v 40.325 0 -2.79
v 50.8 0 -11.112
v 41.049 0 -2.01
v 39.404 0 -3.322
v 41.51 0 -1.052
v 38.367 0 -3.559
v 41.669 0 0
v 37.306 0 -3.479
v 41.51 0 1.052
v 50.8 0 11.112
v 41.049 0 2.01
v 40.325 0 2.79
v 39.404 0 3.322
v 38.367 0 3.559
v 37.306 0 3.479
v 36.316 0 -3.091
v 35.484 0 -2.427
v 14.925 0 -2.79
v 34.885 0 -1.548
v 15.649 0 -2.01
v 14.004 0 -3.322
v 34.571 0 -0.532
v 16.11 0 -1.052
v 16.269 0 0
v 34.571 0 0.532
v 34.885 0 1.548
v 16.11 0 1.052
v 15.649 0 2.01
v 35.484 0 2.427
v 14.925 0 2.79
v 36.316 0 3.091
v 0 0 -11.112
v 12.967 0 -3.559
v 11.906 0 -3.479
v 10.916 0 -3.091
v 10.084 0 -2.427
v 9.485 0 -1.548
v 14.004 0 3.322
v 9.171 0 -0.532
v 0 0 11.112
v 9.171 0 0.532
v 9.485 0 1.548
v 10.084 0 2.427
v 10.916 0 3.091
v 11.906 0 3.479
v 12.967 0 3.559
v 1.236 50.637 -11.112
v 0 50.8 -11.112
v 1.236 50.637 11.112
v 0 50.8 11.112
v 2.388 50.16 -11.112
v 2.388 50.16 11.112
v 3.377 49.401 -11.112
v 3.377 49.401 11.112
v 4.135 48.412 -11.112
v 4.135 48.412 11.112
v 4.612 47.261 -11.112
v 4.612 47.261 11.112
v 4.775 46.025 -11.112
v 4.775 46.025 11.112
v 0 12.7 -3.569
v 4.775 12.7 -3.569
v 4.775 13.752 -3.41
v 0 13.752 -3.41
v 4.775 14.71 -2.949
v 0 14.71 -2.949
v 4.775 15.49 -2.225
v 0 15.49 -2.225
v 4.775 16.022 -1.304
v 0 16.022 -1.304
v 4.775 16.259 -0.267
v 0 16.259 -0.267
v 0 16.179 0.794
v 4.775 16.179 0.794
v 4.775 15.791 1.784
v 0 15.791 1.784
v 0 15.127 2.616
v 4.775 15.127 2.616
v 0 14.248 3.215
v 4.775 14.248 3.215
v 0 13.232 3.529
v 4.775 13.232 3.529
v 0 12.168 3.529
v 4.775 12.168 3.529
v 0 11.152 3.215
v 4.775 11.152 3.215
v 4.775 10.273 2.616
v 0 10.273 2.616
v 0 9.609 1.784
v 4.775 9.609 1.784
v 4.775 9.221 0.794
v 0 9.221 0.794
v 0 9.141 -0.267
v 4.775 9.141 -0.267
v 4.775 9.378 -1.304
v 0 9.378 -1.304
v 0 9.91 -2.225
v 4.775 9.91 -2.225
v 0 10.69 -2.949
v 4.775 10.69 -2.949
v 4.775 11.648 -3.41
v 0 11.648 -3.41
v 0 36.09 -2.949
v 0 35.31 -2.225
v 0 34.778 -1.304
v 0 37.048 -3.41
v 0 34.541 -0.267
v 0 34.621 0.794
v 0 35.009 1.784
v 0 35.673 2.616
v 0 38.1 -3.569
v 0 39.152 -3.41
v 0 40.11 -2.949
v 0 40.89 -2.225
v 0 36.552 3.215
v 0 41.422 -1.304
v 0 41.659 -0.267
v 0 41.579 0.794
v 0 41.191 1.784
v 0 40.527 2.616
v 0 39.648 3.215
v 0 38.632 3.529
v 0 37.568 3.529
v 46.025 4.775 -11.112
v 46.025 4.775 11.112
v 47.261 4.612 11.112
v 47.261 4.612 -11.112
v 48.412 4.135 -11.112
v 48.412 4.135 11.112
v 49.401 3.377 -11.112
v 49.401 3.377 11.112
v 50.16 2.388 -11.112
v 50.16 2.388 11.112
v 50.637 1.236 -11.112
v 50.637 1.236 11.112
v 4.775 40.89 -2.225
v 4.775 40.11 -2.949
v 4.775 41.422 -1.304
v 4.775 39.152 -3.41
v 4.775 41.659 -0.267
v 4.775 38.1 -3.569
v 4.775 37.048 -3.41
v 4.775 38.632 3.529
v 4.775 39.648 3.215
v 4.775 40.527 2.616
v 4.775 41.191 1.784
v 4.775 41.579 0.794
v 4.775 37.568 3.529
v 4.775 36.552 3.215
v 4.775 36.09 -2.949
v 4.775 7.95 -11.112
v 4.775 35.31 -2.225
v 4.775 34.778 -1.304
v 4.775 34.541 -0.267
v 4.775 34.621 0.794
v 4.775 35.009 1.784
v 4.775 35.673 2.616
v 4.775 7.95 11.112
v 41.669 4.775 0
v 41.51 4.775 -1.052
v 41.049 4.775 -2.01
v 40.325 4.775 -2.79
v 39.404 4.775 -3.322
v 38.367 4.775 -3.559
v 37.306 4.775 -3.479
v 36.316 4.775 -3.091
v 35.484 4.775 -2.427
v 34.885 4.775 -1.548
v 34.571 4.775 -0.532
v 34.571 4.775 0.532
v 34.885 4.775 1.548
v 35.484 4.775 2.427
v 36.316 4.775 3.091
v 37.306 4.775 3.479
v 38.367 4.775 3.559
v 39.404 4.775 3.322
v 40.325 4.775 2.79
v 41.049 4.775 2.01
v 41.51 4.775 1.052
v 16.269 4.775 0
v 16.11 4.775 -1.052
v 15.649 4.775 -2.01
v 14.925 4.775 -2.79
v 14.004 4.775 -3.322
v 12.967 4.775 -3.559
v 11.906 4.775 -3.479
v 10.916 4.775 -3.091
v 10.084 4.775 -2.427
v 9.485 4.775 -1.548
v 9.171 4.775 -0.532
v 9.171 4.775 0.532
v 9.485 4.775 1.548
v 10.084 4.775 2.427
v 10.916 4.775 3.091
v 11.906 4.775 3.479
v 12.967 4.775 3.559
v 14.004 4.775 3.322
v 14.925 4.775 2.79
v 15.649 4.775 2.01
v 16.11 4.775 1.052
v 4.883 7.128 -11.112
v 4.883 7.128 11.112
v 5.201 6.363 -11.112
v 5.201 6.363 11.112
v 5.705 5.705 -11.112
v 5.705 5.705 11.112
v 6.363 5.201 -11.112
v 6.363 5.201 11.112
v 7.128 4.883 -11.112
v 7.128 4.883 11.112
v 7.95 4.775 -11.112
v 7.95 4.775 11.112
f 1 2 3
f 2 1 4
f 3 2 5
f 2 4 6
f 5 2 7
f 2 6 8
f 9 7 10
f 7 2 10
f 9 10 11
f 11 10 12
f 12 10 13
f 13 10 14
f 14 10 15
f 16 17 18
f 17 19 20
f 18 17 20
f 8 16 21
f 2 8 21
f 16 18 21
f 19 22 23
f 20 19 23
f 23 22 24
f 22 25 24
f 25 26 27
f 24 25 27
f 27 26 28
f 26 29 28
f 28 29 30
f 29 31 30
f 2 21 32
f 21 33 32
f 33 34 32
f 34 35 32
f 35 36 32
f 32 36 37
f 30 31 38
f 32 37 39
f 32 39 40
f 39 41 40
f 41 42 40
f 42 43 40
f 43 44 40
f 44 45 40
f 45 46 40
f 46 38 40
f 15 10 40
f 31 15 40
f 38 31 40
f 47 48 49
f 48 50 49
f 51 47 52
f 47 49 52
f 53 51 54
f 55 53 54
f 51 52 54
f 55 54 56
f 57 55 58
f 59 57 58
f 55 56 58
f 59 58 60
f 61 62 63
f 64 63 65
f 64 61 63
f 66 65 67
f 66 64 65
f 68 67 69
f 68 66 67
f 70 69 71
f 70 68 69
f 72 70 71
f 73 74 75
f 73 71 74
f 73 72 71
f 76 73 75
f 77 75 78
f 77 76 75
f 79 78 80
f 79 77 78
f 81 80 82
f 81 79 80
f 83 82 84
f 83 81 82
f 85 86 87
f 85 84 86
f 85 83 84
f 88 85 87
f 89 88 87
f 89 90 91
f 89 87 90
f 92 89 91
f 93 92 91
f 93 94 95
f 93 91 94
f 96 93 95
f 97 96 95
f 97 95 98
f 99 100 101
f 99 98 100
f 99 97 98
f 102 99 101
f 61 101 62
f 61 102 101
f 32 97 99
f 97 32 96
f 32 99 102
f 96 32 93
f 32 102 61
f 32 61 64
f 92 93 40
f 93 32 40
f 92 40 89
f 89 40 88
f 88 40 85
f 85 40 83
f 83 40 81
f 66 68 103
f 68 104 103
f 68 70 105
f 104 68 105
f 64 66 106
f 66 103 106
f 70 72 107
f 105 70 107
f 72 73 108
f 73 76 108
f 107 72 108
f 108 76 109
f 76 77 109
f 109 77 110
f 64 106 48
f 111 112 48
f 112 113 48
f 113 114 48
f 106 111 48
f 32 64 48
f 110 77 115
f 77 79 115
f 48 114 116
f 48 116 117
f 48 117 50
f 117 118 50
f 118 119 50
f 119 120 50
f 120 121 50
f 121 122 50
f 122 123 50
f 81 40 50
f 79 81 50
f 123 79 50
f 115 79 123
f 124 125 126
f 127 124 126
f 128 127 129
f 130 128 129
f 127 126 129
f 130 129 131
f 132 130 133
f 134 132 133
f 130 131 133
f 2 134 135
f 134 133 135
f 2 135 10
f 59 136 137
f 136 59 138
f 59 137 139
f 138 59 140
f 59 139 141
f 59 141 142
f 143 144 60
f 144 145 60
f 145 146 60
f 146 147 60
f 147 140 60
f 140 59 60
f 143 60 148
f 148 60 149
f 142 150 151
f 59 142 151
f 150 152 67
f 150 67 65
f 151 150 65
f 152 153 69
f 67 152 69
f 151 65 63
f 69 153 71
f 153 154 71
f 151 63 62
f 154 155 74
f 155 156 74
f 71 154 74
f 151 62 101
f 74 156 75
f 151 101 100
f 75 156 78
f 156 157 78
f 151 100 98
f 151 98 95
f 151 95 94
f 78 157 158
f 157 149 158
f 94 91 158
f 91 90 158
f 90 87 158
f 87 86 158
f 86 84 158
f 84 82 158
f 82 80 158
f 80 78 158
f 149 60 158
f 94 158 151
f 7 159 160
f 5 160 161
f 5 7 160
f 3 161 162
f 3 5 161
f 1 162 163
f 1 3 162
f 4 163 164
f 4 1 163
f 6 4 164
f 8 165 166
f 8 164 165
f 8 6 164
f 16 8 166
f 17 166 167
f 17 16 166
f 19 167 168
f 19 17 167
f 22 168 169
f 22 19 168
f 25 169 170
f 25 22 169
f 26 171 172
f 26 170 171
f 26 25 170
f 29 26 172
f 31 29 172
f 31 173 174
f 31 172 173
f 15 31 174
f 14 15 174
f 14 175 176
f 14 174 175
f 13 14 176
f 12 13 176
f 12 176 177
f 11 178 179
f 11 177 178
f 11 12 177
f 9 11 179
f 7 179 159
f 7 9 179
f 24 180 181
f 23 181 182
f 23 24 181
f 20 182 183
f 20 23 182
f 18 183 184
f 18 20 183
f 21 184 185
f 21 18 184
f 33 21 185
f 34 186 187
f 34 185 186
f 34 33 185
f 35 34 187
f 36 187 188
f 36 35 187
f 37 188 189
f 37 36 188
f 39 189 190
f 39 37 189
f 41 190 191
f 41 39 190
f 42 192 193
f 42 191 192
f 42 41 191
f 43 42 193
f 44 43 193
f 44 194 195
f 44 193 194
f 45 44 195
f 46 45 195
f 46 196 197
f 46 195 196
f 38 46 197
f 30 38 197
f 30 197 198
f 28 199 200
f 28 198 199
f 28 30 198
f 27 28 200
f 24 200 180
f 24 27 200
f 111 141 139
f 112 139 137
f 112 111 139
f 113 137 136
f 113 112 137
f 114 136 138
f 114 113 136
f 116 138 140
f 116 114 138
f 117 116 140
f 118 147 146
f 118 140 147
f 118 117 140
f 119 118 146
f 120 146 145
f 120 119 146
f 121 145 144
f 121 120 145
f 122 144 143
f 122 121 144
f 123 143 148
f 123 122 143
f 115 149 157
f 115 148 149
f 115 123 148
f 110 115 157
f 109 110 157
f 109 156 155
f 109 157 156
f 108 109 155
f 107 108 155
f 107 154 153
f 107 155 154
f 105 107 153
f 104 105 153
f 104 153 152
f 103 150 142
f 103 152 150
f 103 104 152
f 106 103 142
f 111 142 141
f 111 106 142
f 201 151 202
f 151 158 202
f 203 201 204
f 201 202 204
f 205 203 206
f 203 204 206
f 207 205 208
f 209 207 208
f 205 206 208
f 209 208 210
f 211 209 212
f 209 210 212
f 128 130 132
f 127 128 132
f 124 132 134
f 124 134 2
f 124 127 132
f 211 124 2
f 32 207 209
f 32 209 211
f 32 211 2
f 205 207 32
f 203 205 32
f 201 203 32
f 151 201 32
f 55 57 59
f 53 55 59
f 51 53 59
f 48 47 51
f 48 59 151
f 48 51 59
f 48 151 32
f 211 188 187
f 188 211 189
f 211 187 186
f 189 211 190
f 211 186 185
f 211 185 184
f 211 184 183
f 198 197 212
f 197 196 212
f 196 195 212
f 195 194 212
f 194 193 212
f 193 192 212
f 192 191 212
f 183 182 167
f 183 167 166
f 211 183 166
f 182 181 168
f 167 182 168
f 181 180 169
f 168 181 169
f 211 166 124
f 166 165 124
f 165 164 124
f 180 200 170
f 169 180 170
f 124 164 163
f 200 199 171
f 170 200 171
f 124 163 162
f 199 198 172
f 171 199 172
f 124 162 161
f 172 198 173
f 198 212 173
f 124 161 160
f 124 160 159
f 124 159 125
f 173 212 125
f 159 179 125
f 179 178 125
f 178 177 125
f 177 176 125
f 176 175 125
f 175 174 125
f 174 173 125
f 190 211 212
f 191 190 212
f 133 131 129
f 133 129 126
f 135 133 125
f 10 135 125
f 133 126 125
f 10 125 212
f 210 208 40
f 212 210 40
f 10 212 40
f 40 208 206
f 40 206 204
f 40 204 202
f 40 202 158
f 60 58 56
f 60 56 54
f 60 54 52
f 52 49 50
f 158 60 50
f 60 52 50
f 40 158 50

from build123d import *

# Parameters (mm, degrees)
BOSS_EXTRUDE1_DEPTH = 11.1125
SKETCH2_R           = 3.5687
CUT_EXTRUDE1_DEPTH  = 51.8
SKETCH3_R           = 3.5687
CUT_EXTRUDE2_DEPTH  = 51.8


with BuildPart() as part:
    # Sketch1 → Boss-Extrude1 (new body, symmetric)
    with BuildSketch(Plane.XY):
        with BuildLine():
            Line((0, 0), (0, 50.8))
            ThreePointArc((0, 50.8), (3.376576302, 49.401376302), (4.7752, 46.0248))
            Line((4.7752, 46.0248), (4.7752, 7.9502))
            ThreePointArc((4.7752, 7.9502), (5.70513597, 5.70513597), (7.9502, 4.7752))
            Line((7.9502, 4.7752), (46.0248, 4.7752))
            ThreePointArc((46.0248, 4.7752), (49.401376302, 3.376576302), (50.8, 0))
            Line((50.8, 0), (0, 0))
        make_face()
    extrude(amount=BOSS_EXTRUDE1_DEPTH, both=True)

    # Sketch2 → Cut-Extrude1 (cut, through all)
    with BuildSketch(Plane(origin=(0, 0, 0), x_dir=(1, 0, 0), z_dir=(0, 1, 0))):
        with Locations((12.7, 0)):
            Circle(SKETCH2_R)
        with Locations((38.1, 0)):
            Circle(SKETCH2_R)
    extrude(amount=CUT_EXTRUDE1_DEPTH, mode=Mode.SUBTRACT)

    # Sketch3 → Cut-Extrude2 (cut, through all)
    with BuildSketch(Plane(origin=(0, 0, 0), x_dir=(0, 0, -1), z_dir=(1, 0, 0))):
        with Locations((0, 12.7)):
            Circle(SKETCH3_R)
        with Locations((0, 38.1)):
            Circle(SKETCH3_R)
    extrude(amount=CUT_EXTRUDE2_DEPTH, mode=Mode.SUBTRACT)


solid = part.part
